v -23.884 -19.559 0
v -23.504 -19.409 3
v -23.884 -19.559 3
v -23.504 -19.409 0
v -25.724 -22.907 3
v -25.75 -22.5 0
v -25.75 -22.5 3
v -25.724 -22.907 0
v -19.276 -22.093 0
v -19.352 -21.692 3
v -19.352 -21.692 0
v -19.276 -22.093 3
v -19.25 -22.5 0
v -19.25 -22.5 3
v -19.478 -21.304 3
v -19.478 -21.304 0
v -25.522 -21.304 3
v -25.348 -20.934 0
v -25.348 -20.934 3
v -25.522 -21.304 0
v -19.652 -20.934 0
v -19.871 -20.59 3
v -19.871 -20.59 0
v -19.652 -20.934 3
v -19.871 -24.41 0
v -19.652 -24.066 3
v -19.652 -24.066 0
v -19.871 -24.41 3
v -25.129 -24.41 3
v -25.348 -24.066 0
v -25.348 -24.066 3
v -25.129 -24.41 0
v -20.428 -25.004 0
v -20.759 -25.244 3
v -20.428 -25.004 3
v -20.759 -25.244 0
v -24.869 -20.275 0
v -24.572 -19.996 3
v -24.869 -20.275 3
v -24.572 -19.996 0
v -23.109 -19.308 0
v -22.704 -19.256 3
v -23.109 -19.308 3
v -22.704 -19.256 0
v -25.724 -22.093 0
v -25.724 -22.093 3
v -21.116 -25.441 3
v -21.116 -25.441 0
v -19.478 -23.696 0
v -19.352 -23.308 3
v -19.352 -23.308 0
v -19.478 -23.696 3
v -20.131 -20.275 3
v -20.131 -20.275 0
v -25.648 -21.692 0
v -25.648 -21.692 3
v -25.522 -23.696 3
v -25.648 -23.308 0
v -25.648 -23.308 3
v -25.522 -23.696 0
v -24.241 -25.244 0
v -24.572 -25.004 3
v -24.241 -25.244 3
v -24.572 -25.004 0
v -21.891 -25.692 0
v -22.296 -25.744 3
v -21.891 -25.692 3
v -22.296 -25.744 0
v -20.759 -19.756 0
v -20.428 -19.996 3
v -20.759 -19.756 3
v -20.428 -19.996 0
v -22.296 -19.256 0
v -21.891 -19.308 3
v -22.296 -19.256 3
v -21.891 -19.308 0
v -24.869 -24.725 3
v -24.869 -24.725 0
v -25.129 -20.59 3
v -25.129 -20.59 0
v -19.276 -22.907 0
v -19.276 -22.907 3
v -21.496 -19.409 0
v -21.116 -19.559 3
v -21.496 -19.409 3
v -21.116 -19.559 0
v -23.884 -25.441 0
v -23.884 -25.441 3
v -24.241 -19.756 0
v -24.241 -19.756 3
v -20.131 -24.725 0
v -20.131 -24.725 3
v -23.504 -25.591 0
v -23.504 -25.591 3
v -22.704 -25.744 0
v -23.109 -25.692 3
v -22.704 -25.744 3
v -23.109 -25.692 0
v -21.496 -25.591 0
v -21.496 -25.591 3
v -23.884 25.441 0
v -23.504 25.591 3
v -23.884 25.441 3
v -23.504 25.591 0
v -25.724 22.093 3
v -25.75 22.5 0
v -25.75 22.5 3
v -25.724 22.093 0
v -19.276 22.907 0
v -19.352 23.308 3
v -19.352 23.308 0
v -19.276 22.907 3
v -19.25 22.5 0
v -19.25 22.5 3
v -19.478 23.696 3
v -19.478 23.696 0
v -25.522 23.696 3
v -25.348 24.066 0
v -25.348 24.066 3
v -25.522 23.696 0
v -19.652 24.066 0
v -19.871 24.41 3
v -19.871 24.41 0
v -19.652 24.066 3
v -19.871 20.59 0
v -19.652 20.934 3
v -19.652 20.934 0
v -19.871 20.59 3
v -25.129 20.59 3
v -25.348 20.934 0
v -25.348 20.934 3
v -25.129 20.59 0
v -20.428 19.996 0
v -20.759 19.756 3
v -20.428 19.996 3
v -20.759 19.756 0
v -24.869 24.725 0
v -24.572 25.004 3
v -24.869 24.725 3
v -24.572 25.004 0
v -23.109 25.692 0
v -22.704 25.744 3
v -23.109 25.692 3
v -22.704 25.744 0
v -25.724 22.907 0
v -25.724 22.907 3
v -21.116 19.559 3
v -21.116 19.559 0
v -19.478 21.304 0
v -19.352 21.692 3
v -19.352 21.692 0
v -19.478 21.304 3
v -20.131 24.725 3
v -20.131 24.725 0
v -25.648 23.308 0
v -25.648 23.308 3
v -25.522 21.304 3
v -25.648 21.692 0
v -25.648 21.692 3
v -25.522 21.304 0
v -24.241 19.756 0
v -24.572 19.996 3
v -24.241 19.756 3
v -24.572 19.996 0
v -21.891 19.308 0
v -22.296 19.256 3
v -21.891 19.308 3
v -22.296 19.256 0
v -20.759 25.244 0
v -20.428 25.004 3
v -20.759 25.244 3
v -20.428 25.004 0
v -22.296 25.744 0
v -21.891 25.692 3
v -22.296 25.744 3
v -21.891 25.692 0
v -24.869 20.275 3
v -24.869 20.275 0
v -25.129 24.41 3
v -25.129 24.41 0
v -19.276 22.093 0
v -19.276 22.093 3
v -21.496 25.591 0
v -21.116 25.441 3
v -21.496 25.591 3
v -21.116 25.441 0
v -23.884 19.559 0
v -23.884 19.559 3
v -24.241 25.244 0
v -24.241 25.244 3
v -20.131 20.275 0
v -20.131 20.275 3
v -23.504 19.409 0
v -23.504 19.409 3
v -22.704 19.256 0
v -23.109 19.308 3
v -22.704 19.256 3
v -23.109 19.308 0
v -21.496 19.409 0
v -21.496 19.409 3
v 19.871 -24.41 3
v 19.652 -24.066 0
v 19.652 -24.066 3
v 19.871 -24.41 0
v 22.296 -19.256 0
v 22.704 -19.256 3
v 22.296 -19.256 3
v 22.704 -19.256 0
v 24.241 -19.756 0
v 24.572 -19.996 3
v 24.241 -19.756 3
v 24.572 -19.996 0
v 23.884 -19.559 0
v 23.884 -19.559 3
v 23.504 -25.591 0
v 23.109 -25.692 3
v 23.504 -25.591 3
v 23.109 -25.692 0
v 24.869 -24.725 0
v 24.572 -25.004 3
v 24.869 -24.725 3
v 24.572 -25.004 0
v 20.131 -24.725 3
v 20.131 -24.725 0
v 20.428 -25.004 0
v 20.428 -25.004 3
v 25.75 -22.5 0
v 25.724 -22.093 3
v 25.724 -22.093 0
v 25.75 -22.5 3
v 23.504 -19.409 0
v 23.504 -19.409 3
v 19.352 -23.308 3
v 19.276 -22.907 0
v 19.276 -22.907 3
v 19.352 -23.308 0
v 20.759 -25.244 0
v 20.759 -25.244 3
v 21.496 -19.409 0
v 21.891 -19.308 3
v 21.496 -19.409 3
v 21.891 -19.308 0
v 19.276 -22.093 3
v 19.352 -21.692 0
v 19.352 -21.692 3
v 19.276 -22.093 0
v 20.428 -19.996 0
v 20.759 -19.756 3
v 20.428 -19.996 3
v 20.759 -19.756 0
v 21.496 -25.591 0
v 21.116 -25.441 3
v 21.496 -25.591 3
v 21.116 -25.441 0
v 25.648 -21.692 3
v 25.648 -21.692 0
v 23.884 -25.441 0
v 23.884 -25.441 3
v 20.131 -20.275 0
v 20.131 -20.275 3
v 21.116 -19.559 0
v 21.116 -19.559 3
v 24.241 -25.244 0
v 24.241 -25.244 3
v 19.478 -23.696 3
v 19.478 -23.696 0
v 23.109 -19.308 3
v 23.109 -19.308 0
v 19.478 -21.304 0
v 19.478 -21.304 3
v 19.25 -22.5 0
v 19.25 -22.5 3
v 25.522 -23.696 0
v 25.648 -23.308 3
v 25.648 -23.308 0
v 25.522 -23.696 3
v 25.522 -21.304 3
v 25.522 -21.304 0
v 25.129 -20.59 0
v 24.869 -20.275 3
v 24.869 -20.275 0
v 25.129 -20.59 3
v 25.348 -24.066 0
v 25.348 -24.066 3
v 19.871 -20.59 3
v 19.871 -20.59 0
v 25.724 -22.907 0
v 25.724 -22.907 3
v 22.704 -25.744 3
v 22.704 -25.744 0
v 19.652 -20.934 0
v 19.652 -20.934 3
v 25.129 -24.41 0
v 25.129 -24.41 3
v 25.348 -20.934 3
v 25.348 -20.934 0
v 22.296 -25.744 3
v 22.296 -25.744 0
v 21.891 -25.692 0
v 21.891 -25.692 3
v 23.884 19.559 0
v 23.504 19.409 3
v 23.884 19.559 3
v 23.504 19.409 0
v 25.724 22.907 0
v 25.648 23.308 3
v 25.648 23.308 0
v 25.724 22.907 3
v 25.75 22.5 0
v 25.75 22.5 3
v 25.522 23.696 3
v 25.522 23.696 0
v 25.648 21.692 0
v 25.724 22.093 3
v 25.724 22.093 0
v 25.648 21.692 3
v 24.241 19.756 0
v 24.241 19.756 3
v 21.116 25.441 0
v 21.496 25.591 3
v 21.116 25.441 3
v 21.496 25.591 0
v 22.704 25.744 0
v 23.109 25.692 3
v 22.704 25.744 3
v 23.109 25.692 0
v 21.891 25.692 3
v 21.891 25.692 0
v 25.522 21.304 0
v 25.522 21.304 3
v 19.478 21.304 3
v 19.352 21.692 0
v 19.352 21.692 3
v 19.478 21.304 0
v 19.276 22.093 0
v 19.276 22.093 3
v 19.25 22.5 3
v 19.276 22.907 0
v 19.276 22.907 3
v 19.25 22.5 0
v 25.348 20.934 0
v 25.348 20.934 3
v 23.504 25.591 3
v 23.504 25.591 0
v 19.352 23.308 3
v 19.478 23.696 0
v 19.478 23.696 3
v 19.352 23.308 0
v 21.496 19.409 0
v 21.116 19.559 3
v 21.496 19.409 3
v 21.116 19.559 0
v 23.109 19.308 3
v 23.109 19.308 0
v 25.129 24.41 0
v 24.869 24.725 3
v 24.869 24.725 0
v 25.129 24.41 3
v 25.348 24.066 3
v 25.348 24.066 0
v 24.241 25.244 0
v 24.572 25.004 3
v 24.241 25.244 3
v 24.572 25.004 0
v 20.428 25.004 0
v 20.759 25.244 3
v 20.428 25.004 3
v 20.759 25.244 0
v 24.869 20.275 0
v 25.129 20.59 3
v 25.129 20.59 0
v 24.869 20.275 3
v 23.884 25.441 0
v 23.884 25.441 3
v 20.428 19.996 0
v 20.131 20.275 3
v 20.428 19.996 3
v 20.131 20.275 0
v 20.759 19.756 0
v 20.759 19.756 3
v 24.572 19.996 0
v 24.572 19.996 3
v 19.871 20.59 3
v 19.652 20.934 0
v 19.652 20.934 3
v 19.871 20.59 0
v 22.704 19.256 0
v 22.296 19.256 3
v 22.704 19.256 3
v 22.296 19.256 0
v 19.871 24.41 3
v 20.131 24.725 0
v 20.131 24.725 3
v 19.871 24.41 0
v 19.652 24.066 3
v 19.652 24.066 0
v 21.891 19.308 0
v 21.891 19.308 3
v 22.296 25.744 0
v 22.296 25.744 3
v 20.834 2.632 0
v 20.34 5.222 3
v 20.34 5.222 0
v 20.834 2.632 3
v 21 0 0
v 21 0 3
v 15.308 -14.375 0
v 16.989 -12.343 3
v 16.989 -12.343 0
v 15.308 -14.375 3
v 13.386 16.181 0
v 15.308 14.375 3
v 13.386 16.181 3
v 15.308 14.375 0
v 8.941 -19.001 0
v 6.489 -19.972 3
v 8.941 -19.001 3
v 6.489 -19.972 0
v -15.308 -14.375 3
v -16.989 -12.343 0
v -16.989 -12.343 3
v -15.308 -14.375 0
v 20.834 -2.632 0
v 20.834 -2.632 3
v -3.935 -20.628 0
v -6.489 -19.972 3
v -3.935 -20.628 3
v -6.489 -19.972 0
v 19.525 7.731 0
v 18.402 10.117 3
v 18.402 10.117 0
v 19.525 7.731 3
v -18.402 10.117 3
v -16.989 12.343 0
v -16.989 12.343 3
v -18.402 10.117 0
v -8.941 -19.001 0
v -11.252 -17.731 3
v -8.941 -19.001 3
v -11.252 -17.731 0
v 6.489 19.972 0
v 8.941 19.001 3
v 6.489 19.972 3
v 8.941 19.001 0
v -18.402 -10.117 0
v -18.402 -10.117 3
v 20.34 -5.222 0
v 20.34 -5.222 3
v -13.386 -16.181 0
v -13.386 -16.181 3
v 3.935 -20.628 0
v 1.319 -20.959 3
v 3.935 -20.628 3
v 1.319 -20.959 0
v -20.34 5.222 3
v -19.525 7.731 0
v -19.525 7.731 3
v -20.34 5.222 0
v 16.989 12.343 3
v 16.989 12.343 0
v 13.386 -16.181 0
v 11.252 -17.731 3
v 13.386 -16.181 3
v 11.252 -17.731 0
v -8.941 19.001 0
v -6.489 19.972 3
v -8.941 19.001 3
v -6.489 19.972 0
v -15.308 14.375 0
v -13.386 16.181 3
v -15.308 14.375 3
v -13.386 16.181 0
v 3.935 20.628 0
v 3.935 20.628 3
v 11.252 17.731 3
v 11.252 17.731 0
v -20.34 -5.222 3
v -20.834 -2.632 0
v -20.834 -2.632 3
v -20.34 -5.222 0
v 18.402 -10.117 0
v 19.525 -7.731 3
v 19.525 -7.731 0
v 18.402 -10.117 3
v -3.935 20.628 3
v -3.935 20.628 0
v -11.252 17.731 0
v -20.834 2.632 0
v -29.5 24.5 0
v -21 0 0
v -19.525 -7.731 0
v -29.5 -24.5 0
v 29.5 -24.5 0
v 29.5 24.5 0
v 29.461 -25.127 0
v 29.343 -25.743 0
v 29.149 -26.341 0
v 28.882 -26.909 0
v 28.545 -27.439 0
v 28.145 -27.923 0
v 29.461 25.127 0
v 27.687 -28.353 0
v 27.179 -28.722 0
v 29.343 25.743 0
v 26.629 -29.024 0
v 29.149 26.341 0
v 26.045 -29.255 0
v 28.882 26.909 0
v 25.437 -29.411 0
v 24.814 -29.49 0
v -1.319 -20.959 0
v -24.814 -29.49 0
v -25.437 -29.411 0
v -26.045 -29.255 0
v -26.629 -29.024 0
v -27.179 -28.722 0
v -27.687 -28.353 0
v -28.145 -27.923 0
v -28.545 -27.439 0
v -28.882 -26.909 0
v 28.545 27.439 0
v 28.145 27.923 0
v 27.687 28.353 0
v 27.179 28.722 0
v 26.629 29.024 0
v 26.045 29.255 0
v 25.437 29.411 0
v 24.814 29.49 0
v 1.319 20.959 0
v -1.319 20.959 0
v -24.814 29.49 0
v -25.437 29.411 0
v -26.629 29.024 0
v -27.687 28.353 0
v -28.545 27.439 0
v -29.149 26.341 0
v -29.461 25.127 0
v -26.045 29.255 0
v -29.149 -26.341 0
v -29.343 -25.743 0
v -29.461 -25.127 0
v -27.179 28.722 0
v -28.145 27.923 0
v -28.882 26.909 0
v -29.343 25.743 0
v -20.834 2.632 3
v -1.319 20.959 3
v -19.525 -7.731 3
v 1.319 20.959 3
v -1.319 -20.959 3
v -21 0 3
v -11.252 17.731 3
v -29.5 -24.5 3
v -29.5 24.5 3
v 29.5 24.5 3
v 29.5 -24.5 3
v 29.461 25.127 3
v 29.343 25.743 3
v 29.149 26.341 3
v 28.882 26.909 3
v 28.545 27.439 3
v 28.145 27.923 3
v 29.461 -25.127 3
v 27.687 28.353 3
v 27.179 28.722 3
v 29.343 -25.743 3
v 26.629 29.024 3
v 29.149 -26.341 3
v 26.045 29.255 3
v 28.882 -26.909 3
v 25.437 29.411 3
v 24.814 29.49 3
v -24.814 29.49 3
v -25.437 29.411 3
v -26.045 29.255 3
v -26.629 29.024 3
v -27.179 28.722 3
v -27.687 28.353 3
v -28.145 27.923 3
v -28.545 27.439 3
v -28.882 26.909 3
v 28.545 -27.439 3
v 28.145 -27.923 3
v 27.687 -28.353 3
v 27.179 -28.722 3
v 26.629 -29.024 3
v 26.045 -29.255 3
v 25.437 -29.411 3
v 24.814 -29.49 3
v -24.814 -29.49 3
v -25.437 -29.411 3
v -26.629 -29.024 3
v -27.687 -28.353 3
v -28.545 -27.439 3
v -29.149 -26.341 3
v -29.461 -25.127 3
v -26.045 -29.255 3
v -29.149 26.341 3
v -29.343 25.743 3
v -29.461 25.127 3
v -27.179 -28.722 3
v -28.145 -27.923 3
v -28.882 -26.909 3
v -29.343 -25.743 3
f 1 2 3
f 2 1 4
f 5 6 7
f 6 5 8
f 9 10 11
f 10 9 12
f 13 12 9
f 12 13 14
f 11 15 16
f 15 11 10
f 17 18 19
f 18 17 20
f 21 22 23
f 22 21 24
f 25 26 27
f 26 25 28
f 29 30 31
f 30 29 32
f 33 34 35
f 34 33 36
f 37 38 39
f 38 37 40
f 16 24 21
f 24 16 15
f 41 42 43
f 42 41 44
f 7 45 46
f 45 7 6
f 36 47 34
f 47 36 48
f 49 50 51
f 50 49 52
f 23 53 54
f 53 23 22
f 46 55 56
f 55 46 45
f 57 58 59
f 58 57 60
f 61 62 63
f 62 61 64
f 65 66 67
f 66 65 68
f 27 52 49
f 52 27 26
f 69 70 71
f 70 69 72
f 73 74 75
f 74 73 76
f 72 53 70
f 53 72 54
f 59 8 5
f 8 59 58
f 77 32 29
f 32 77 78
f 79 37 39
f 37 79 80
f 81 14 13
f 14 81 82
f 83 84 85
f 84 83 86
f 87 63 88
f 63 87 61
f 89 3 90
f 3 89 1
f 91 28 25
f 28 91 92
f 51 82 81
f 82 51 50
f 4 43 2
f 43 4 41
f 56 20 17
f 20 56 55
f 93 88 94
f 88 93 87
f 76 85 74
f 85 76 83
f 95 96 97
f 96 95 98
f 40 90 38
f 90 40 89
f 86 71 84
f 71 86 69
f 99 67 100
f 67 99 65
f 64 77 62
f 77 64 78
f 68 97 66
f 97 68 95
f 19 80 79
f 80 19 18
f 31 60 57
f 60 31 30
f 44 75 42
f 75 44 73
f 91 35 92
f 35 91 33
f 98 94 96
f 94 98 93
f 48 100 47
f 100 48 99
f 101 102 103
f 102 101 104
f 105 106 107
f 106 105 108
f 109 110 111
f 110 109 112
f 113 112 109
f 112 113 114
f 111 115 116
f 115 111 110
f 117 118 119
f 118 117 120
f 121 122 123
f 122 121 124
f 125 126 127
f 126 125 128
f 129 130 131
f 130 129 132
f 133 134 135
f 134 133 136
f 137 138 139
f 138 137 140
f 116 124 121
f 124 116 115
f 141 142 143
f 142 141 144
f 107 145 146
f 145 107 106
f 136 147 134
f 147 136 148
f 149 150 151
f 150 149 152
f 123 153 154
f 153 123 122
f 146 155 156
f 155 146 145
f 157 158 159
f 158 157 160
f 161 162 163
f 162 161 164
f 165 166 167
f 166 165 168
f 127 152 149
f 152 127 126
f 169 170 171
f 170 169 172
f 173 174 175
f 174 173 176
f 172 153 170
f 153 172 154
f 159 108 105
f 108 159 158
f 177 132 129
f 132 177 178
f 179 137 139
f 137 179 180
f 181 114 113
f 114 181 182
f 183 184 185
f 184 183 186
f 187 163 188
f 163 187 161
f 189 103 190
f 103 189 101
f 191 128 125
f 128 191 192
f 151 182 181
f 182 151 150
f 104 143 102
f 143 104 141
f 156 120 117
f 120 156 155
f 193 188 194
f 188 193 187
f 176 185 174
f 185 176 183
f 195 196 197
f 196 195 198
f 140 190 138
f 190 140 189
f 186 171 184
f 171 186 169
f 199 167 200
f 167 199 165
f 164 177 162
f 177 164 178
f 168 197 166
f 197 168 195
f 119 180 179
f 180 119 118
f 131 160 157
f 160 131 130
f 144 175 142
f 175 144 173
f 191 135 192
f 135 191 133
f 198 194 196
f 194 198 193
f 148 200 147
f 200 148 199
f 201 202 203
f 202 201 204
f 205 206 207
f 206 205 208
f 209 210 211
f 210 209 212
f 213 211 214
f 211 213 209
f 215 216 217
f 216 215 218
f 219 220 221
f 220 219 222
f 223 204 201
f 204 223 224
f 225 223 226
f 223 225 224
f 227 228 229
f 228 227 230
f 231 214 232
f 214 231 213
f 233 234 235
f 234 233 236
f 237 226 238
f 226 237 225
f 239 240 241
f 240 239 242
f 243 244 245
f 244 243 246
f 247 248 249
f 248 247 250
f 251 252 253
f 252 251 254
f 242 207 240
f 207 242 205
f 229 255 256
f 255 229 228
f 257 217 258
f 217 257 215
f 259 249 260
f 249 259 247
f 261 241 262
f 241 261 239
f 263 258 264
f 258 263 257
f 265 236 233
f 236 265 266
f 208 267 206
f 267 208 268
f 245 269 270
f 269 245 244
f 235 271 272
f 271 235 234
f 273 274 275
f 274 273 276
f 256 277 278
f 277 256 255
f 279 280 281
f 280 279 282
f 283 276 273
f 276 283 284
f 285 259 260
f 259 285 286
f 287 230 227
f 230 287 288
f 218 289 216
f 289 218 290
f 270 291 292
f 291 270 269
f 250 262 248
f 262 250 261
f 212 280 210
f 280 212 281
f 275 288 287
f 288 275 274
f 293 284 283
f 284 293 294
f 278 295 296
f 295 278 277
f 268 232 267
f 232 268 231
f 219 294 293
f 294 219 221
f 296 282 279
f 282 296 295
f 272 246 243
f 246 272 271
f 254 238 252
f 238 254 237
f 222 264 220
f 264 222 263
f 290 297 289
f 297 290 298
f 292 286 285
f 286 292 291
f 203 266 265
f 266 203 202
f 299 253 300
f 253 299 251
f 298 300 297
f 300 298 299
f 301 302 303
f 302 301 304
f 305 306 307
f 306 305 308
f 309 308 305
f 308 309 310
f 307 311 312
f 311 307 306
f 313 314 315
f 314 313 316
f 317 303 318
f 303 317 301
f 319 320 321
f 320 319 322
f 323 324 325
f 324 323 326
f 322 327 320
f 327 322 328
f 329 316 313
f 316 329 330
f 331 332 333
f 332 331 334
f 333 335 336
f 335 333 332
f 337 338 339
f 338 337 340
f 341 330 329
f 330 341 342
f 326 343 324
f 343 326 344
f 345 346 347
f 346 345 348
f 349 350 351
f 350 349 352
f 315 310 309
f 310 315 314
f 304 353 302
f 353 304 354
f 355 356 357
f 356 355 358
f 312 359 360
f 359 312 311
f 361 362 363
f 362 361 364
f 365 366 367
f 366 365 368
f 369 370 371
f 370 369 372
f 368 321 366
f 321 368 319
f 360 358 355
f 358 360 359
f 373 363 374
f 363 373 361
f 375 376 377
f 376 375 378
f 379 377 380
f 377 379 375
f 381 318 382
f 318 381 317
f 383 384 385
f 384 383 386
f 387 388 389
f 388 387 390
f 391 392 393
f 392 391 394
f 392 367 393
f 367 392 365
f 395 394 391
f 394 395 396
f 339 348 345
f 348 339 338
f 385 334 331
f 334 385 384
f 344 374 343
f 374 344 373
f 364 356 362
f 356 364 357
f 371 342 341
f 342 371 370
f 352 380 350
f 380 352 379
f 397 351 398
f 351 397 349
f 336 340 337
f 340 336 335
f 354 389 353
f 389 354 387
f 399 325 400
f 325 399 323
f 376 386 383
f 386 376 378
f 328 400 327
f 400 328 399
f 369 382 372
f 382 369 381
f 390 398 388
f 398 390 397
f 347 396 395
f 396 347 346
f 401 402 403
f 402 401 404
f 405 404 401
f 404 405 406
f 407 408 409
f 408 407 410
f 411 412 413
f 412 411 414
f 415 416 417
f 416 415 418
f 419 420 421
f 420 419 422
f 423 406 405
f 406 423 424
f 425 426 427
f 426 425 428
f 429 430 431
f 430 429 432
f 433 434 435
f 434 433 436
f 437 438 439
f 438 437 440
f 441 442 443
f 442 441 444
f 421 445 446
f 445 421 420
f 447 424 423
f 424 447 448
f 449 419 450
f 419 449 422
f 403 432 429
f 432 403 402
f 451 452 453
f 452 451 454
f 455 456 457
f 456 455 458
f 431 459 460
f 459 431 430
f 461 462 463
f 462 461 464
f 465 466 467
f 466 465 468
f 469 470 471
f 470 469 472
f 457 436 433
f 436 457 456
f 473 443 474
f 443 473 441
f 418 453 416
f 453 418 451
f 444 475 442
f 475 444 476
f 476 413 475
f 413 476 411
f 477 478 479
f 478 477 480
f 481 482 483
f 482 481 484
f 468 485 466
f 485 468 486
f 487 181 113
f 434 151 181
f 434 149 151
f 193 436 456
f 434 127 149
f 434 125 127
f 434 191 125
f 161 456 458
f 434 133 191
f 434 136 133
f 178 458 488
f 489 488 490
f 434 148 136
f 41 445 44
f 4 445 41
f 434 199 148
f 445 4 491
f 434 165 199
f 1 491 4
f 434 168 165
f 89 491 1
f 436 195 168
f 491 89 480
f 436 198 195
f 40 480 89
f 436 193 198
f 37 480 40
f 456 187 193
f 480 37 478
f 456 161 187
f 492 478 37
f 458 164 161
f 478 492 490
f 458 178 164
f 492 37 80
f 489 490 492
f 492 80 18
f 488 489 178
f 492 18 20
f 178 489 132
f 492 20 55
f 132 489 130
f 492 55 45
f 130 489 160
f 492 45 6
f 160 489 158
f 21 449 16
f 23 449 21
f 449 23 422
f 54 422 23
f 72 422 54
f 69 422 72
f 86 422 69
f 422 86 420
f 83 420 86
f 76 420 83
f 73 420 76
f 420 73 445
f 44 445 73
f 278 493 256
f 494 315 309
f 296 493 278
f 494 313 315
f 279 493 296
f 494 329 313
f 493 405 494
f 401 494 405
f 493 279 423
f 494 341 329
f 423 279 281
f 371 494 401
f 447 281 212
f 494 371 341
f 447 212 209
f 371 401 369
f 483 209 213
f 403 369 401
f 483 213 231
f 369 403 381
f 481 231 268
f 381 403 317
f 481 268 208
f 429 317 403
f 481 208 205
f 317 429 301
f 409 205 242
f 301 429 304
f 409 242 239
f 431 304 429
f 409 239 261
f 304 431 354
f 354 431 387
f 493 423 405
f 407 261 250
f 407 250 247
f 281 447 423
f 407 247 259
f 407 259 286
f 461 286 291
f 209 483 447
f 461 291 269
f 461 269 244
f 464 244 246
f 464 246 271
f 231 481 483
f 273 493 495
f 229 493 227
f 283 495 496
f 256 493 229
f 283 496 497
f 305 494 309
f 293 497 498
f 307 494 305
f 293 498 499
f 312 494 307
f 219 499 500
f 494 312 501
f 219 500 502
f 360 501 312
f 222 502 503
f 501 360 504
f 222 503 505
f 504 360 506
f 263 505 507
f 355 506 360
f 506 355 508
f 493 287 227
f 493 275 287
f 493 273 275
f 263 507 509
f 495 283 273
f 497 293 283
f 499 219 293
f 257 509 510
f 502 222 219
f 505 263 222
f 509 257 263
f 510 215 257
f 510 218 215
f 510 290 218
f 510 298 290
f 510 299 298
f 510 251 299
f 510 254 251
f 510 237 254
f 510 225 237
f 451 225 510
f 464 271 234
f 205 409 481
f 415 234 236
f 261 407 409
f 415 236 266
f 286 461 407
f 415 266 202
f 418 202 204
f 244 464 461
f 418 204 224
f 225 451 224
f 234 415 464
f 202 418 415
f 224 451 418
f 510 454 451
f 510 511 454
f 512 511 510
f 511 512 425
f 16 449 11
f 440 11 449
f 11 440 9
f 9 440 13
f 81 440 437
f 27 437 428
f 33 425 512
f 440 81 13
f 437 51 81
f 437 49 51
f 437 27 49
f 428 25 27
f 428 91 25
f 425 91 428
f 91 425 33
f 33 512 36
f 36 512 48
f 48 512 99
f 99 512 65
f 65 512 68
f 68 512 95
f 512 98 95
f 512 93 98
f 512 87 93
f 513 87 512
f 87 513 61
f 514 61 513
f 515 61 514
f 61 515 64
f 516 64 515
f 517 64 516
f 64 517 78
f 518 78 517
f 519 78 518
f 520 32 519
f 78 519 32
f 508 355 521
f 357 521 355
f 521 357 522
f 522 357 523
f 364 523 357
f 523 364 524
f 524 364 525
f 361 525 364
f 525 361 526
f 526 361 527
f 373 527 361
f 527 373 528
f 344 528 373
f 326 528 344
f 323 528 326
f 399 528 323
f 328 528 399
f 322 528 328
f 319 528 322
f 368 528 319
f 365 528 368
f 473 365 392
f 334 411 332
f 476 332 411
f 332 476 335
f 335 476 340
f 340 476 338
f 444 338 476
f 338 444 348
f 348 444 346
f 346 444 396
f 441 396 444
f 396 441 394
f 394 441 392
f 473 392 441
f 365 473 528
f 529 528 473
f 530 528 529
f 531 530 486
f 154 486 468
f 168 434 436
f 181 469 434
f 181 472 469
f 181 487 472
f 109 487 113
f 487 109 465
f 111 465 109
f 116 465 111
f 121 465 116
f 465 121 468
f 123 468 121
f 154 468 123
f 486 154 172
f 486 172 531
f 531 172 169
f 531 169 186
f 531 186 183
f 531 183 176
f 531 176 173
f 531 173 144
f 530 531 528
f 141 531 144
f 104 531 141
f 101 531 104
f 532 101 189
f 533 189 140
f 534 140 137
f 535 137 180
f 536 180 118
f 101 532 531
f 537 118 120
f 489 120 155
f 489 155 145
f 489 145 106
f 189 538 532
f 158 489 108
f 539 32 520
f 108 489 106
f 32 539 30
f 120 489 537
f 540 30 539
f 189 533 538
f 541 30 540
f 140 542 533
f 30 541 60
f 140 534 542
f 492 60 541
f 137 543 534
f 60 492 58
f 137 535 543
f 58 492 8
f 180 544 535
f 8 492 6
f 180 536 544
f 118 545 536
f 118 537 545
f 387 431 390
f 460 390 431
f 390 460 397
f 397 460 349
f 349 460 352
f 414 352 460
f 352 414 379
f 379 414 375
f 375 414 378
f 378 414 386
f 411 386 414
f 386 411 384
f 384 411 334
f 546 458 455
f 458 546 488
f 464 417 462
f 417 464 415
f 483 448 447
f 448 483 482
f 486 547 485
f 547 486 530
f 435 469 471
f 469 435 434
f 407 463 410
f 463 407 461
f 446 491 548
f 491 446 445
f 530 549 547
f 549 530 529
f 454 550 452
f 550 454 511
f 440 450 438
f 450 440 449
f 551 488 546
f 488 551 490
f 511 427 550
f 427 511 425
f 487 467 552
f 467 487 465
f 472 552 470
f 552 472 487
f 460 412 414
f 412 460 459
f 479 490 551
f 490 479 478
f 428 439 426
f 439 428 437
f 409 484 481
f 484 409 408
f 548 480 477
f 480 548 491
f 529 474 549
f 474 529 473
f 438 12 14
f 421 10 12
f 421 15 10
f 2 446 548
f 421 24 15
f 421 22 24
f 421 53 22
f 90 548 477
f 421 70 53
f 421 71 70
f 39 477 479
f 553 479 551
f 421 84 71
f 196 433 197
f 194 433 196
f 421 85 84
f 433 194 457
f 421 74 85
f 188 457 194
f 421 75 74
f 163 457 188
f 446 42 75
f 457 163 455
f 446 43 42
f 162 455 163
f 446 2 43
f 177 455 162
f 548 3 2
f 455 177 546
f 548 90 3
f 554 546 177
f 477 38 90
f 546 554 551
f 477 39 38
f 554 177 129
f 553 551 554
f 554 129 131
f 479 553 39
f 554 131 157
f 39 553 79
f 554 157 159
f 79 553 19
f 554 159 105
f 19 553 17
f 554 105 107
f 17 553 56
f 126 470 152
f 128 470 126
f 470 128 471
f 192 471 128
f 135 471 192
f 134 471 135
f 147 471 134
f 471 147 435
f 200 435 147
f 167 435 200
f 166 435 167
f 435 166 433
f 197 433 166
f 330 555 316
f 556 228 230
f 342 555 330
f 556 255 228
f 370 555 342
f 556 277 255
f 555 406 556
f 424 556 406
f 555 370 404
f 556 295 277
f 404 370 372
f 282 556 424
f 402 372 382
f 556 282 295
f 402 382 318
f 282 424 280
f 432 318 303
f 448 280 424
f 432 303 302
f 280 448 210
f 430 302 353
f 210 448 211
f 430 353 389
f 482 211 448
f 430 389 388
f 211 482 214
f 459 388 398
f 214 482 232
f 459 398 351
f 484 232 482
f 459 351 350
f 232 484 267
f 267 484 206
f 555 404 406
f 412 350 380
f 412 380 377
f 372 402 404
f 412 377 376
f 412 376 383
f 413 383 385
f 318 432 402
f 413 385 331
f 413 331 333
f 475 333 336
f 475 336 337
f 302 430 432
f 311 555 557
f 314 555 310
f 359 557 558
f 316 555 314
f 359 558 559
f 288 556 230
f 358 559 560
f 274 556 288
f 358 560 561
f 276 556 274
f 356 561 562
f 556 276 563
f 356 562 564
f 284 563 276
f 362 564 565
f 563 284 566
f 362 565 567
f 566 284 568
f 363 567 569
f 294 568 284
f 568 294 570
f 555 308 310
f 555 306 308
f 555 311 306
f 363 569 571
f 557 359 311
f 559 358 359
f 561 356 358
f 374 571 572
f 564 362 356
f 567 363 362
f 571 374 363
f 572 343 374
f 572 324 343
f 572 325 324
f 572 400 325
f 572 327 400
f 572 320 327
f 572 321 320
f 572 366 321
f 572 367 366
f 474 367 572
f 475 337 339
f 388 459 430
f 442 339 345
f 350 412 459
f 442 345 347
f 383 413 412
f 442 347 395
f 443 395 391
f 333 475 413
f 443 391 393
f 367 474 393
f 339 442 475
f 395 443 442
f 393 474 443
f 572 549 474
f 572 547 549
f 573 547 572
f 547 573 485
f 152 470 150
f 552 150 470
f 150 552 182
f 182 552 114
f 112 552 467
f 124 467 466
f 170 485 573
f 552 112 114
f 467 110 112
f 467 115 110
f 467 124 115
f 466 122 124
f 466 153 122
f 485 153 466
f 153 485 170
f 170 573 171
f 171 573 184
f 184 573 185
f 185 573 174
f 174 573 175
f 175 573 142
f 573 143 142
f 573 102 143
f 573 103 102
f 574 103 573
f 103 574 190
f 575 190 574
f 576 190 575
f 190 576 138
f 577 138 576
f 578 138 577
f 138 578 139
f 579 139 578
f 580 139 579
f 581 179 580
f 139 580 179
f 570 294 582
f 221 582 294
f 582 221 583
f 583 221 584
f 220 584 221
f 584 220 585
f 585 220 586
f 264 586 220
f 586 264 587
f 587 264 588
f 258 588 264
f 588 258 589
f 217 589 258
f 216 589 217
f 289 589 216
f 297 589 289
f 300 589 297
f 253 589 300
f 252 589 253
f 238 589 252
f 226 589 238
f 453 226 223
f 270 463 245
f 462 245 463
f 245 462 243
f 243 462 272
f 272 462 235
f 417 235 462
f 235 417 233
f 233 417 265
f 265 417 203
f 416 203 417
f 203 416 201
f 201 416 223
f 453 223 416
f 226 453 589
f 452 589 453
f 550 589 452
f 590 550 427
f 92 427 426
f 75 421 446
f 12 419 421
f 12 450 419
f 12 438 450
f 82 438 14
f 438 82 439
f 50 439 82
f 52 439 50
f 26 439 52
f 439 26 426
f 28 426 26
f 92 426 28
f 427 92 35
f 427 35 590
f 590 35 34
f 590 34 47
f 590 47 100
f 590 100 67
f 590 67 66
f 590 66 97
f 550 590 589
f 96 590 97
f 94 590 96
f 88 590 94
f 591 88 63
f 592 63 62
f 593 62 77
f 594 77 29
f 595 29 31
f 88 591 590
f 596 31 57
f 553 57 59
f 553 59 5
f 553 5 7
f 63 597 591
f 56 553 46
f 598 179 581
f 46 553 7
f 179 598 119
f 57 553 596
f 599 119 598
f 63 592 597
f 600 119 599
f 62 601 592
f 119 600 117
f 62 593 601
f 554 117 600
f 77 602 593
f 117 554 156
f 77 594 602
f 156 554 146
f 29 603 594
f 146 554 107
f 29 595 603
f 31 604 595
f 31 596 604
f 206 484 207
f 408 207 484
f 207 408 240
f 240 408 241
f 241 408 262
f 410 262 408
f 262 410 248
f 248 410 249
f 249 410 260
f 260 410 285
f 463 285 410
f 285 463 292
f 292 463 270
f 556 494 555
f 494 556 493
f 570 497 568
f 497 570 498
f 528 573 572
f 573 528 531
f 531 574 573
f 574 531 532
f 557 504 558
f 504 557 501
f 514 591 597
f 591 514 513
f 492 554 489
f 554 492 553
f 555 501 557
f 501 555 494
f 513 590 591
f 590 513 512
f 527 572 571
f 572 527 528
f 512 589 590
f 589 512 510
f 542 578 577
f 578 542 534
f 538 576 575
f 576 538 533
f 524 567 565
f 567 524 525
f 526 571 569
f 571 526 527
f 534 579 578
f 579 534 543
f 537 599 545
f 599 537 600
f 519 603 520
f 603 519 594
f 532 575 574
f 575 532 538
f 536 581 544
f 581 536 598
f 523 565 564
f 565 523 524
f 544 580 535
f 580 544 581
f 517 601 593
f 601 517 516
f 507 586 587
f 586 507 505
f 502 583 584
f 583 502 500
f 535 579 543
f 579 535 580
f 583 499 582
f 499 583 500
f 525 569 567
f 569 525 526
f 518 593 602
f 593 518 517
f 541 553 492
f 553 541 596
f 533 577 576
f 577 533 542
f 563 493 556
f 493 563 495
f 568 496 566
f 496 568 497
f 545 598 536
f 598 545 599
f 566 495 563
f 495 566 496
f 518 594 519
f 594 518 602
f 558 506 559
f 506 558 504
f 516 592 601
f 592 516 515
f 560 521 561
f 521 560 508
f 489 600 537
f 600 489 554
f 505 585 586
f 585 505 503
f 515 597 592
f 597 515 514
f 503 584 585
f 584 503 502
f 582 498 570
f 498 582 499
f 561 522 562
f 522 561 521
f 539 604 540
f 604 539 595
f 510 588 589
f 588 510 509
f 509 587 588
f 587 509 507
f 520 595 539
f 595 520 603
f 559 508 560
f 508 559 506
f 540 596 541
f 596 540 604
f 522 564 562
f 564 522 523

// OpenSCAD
$fn = 50;

difference() {
	union() {
		hull() {
			translate(v = [-24.5, 24.5, 0]) {
				cylinder(h = 3, r = 5);
			}
			translate(v = [24.5, 24.5, 0]) {
				cylinder(h = 3, r = 5);
			}
			translate(v = [-24.5, -24.5, 0]) {
				cylinder(h = 3, r = 5);
			}
			translate(v = [24.5, -24.5, 0]) {
				cylinder(h = 3, r = 5);
			}
		}
	}
	union() {
		translate(v = [-22.5, -22.5, -100.0]) {
			cylinder(h = 200, r = 3.25);
		}
		translate(v = [-22.5, 22.5, -100.0]) {
			cylinder(h = 200, r = 3.25);
		}
		translate(v = [22.5, -22.5, -100.0]) {
			cylinder(h = 200, r = 3.25);
		}
		translate(v = [22.5, 22.5, -100.0]) {
			cylinder(h = 200, r = 3.25);
		}
		translate(v = [-22.5, -22.5, -100.0]) {
			cylinder(h = 200, r = 1.8);
		}
		translate(v = [-22.5, 22.5, -100.0]) {
			cylinder(h = 200, r = 1.8);
		}
		translate(v = [22.5, -22.5, -100.0]) {
			cylinder(h = 200, r = 1.8);
		}
		translate(v = [22.5, 22.5, -100.0]) {
			cylinder(h = 200, r = 1.8);
		}
		cylinder(h = 3, r = 21.0);
	}
}
